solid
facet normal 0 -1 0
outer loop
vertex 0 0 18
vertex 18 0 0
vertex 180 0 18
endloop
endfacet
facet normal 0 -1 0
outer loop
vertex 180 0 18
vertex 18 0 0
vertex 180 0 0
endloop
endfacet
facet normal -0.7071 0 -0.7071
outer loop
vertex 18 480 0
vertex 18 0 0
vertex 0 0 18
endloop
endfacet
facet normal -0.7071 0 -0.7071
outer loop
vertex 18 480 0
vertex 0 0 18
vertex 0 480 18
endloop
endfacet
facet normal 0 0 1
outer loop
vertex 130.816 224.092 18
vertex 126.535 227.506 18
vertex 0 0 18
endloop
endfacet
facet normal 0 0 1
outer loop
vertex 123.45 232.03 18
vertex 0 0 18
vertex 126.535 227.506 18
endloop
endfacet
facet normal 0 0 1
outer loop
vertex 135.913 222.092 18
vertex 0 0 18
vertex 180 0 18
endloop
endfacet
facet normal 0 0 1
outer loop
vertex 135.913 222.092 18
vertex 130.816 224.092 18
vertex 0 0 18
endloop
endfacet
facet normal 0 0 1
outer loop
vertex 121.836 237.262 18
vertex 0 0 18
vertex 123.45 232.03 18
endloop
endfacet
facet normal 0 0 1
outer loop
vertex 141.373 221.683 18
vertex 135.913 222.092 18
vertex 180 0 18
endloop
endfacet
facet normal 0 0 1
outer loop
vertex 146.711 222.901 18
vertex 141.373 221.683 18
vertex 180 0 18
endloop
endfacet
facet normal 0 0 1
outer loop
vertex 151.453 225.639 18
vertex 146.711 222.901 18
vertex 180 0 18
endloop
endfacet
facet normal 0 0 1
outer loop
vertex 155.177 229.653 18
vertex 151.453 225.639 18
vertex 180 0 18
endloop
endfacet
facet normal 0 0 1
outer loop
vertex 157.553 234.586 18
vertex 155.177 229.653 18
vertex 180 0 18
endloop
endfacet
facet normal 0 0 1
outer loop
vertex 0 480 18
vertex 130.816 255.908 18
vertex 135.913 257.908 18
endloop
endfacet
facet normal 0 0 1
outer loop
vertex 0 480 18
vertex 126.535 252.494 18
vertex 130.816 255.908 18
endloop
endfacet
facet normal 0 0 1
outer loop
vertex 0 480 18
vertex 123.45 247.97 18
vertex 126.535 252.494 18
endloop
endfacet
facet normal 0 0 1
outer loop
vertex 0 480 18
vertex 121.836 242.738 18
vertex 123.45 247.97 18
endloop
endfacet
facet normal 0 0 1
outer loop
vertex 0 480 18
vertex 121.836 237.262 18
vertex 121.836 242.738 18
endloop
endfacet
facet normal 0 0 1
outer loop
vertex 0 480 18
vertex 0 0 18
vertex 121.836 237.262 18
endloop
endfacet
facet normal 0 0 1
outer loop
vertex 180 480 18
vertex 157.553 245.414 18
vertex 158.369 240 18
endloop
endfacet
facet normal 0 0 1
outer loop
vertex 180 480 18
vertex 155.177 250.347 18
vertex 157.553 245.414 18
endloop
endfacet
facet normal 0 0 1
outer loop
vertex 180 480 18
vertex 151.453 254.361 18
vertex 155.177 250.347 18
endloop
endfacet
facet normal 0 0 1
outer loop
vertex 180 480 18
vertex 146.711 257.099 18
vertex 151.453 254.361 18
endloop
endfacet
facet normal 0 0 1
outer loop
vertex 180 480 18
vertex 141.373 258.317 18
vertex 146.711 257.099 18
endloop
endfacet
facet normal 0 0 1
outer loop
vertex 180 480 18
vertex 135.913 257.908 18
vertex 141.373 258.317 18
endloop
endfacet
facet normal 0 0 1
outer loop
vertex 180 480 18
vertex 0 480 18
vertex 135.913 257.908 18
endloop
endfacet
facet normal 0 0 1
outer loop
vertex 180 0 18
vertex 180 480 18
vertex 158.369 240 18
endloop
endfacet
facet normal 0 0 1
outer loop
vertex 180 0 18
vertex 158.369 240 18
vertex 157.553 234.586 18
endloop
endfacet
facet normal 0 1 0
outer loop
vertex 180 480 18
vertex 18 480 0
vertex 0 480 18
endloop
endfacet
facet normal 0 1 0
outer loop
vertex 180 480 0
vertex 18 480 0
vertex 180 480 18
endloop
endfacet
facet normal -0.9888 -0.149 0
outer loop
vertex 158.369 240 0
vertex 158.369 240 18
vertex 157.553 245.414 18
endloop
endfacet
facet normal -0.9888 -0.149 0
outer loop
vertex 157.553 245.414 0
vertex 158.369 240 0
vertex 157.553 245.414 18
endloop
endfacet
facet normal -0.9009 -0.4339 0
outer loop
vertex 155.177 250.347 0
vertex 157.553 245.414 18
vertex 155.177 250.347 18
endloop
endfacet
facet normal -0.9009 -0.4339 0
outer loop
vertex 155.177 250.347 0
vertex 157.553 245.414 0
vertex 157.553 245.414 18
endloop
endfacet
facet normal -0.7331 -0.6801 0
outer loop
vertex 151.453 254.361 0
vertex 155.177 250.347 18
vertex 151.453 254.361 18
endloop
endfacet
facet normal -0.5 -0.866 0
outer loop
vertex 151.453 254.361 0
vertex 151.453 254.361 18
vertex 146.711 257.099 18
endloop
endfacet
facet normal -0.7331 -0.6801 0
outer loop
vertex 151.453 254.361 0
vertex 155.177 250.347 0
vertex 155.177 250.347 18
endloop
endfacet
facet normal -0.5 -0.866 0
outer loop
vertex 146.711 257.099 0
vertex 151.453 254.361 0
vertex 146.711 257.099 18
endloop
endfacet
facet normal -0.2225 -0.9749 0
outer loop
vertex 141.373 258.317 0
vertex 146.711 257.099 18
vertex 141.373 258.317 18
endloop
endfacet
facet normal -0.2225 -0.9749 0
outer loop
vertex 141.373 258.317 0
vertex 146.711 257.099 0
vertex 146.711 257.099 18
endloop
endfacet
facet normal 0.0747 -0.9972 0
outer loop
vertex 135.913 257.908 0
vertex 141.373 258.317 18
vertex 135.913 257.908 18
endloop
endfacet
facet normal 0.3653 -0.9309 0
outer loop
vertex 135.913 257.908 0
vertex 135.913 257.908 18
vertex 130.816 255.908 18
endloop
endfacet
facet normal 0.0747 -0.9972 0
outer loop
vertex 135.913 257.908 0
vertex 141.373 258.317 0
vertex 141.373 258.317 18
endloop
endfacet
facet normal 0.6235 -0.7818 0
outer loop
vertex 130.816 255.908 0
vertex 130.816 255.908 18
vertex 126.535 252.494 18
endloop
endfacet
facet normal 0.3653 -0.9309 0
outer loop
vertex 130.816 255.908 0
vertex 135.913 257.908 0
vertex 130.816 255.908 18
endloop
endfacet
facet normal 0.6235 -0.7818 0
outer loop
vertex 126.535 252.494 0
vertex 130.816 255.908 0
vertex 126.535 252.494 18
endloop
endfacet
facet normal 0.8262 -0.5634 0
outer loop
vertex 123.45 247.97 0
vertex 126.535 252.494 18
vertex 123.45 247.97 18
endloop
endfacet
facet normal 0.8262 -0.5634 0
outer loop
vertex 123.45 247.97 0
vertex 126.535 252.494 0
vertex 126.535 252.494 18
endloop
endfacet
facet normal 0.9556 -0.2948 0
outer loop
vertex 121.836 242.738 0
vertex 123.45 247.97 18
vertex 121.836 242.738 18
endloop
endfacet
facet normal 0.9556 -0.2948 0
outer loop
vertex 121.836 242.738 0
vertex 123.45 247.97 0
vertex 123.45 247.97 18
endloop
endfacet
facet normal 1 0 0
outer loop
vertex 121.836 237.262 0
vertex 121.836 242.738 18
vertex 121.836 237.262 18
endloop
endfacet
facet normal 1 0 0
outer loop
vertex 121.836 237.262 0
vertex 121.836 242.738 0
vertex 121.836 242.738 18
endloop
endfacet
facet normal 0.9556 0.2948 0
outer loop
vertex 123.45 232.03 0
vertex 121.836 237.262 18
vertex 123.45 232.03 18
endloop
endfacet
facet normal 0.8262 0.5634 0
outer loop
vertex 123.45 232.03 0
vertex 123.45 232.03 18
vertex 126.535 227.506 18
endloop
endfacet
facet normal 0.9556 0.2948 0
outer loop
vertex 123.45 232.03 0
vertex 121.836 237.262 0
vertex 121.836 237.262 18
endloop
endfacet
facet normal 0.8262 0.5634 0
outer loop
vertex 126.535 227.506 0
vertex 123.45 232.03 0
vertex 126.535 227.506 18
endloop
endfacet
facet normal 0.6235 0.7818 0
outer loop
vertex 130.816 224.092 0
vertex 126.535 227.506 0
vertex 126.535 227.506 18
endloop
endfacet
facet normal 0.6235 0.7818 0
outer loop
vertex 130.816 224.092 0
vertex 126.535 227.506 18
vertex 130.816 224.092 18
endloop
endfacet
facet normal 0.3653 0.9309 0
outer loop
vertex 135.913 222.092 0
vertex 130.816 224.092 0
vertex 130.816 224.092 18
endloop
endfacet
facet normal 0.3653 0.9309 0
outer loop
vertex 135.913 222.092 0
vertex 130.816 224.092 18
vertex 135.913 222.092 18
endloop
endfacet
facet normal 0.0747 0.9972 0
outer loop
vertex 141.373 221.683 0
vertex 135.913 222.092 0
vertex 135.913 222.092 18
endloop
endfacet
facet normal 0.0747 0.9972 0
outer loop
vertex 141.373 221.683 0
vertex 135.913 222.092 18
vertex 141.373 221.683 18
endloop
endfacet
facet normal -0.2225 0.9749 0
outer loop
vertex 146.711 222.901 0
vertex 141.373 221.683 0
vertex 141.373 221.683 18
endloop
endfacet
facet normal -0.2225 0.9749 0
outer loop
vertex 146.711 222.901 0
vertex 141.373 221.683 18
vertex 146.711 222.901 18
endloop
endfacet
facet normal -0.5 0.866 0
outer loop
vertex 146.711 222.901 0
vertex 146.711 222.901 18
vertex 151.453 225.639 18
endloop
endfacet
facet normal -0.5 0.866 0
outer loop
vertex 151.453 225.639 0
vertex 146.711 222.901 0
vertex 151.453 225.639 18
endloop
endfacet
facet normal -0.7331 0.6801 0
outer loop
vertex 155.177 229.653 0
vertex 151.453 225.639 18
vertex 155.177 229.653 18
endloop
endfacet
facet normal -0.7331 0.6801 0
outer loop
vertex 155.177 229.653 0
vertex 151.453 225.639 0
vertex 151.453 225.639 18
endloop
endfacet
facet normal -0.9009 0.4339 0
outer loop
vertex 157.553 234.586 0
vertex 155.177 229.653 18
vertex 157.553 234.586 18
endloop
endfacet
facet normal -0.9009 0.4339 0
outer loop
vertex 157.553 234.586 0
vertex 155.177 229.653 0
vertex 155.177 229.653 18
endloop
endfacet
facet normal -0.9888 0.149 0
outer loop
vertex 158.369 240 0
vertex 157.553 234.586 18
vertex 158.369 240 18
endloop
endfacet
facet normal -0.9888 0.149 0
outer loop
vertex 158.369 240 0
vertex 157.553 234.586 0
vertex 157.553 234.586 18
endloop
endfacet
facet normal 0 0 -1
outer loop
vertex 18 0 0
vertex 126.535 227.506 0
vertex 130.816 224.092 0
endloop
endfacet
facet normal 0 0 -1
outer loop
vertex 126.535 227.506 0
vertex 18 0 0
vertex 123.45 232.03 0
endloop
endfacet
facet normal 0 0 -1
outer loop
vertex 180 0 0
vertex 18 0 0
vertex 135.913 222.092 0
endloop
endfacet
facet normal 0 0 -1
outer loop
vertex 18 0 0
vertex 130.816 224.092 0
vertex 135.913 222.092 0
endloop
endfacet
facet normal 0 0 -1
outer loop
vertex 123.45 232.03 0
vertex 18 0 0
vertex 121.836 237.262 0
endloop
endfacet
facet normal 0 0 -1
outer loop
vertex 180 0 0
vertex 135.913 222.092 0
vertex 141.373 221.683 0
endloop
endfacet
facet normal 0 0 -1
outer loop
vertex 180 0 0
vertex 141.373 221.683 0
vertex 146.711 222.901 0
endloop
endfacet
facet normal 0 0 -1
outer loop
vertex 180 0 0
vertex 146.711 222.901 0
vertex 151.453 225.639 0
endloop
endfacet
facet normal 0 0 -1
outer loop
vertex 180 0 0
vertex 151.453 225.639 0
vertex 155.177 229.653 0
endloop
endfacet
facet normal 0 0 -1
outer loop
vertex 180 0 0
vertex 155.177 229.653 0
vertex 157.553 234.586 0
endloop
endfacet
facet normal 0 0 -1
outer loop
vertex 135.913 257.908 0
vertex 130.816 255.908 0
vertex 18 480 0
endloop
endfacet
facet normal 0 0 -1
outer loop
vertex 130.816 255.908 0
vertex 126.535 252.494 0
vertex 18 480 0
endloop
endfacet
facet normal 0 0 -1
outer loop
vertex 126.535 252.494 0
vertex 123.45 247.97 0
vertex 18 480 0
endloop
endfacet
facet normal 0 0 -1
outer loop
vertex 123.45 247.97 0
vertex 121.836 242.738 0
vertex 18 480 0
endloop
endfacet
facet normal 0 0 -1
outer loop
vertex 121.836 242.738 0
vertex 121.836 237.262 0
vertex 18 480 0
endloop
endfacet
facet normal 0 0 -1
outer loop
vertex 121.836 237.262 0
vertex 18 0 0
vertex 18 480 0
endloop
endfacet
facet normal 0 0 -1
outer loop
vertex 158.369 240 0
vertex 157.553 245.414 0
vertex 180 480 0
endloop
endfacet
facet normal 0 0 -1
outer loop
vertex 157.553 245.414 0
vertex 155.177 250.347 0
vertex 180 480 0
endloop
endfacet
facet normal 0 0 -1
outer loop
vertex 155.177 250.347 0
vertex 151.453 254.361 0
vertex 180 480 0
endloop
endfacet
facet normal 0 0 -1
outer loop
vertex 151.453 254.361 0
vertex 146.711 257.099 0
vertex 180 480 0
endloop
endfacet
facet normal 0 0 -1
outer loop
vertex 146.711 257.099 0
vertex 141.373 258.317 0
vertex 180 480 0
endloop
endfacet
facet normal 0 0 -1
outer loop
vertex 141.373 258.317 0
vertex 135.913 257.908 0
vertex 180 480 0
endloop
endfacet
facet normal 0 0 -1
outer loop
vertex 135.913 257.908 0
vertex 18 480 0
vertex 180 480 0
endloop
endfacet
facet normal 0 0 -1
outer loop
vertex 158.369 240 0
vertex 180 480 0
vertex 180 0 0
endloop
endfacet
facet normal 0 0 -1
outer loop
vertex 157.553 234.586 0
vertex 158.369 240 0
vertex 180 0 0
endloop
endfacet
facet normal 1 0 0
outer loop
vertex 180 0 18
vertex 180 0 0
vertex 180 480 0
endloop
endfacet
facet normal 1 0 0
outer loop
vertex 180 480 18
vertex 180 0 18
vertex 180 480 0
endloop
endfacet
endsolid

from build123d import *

# Parameters (mm, degrees)
SKETCH1_W           = 180
SKETCH1_H           = 480
SKETCH1_R           = 18.368726539
BOSS_EXTRUDE1_DEPTH = 18
CHAMFER1_SIZE       = 18


with BuildPart() as part:
    # Sketch1 → Boss-Extrude1 (new body)
    with BuildSketch(Plane.XY):
        with Locations((90, 240)):
            Rectangle(SKETCH1_W, SKETCH1_H)
        with Locations((140, 240)):
            Circle(SKETCH1_R, mode=Mode.SUBTRACT)
    extrude(amount=BOSS_EXTRUDE1_DEPTH)

    # Chamfer1
    chamfer1_edges = [part.edges().sort_by_distance(p)[0] for p in [
        (0, 240, 0),
    ]]
    chamfer(chamfer1_edges, length=CHAMFER1_SIZE - 0.0001)  # a hair under: the kernel refuses the full size


solid = part.part
